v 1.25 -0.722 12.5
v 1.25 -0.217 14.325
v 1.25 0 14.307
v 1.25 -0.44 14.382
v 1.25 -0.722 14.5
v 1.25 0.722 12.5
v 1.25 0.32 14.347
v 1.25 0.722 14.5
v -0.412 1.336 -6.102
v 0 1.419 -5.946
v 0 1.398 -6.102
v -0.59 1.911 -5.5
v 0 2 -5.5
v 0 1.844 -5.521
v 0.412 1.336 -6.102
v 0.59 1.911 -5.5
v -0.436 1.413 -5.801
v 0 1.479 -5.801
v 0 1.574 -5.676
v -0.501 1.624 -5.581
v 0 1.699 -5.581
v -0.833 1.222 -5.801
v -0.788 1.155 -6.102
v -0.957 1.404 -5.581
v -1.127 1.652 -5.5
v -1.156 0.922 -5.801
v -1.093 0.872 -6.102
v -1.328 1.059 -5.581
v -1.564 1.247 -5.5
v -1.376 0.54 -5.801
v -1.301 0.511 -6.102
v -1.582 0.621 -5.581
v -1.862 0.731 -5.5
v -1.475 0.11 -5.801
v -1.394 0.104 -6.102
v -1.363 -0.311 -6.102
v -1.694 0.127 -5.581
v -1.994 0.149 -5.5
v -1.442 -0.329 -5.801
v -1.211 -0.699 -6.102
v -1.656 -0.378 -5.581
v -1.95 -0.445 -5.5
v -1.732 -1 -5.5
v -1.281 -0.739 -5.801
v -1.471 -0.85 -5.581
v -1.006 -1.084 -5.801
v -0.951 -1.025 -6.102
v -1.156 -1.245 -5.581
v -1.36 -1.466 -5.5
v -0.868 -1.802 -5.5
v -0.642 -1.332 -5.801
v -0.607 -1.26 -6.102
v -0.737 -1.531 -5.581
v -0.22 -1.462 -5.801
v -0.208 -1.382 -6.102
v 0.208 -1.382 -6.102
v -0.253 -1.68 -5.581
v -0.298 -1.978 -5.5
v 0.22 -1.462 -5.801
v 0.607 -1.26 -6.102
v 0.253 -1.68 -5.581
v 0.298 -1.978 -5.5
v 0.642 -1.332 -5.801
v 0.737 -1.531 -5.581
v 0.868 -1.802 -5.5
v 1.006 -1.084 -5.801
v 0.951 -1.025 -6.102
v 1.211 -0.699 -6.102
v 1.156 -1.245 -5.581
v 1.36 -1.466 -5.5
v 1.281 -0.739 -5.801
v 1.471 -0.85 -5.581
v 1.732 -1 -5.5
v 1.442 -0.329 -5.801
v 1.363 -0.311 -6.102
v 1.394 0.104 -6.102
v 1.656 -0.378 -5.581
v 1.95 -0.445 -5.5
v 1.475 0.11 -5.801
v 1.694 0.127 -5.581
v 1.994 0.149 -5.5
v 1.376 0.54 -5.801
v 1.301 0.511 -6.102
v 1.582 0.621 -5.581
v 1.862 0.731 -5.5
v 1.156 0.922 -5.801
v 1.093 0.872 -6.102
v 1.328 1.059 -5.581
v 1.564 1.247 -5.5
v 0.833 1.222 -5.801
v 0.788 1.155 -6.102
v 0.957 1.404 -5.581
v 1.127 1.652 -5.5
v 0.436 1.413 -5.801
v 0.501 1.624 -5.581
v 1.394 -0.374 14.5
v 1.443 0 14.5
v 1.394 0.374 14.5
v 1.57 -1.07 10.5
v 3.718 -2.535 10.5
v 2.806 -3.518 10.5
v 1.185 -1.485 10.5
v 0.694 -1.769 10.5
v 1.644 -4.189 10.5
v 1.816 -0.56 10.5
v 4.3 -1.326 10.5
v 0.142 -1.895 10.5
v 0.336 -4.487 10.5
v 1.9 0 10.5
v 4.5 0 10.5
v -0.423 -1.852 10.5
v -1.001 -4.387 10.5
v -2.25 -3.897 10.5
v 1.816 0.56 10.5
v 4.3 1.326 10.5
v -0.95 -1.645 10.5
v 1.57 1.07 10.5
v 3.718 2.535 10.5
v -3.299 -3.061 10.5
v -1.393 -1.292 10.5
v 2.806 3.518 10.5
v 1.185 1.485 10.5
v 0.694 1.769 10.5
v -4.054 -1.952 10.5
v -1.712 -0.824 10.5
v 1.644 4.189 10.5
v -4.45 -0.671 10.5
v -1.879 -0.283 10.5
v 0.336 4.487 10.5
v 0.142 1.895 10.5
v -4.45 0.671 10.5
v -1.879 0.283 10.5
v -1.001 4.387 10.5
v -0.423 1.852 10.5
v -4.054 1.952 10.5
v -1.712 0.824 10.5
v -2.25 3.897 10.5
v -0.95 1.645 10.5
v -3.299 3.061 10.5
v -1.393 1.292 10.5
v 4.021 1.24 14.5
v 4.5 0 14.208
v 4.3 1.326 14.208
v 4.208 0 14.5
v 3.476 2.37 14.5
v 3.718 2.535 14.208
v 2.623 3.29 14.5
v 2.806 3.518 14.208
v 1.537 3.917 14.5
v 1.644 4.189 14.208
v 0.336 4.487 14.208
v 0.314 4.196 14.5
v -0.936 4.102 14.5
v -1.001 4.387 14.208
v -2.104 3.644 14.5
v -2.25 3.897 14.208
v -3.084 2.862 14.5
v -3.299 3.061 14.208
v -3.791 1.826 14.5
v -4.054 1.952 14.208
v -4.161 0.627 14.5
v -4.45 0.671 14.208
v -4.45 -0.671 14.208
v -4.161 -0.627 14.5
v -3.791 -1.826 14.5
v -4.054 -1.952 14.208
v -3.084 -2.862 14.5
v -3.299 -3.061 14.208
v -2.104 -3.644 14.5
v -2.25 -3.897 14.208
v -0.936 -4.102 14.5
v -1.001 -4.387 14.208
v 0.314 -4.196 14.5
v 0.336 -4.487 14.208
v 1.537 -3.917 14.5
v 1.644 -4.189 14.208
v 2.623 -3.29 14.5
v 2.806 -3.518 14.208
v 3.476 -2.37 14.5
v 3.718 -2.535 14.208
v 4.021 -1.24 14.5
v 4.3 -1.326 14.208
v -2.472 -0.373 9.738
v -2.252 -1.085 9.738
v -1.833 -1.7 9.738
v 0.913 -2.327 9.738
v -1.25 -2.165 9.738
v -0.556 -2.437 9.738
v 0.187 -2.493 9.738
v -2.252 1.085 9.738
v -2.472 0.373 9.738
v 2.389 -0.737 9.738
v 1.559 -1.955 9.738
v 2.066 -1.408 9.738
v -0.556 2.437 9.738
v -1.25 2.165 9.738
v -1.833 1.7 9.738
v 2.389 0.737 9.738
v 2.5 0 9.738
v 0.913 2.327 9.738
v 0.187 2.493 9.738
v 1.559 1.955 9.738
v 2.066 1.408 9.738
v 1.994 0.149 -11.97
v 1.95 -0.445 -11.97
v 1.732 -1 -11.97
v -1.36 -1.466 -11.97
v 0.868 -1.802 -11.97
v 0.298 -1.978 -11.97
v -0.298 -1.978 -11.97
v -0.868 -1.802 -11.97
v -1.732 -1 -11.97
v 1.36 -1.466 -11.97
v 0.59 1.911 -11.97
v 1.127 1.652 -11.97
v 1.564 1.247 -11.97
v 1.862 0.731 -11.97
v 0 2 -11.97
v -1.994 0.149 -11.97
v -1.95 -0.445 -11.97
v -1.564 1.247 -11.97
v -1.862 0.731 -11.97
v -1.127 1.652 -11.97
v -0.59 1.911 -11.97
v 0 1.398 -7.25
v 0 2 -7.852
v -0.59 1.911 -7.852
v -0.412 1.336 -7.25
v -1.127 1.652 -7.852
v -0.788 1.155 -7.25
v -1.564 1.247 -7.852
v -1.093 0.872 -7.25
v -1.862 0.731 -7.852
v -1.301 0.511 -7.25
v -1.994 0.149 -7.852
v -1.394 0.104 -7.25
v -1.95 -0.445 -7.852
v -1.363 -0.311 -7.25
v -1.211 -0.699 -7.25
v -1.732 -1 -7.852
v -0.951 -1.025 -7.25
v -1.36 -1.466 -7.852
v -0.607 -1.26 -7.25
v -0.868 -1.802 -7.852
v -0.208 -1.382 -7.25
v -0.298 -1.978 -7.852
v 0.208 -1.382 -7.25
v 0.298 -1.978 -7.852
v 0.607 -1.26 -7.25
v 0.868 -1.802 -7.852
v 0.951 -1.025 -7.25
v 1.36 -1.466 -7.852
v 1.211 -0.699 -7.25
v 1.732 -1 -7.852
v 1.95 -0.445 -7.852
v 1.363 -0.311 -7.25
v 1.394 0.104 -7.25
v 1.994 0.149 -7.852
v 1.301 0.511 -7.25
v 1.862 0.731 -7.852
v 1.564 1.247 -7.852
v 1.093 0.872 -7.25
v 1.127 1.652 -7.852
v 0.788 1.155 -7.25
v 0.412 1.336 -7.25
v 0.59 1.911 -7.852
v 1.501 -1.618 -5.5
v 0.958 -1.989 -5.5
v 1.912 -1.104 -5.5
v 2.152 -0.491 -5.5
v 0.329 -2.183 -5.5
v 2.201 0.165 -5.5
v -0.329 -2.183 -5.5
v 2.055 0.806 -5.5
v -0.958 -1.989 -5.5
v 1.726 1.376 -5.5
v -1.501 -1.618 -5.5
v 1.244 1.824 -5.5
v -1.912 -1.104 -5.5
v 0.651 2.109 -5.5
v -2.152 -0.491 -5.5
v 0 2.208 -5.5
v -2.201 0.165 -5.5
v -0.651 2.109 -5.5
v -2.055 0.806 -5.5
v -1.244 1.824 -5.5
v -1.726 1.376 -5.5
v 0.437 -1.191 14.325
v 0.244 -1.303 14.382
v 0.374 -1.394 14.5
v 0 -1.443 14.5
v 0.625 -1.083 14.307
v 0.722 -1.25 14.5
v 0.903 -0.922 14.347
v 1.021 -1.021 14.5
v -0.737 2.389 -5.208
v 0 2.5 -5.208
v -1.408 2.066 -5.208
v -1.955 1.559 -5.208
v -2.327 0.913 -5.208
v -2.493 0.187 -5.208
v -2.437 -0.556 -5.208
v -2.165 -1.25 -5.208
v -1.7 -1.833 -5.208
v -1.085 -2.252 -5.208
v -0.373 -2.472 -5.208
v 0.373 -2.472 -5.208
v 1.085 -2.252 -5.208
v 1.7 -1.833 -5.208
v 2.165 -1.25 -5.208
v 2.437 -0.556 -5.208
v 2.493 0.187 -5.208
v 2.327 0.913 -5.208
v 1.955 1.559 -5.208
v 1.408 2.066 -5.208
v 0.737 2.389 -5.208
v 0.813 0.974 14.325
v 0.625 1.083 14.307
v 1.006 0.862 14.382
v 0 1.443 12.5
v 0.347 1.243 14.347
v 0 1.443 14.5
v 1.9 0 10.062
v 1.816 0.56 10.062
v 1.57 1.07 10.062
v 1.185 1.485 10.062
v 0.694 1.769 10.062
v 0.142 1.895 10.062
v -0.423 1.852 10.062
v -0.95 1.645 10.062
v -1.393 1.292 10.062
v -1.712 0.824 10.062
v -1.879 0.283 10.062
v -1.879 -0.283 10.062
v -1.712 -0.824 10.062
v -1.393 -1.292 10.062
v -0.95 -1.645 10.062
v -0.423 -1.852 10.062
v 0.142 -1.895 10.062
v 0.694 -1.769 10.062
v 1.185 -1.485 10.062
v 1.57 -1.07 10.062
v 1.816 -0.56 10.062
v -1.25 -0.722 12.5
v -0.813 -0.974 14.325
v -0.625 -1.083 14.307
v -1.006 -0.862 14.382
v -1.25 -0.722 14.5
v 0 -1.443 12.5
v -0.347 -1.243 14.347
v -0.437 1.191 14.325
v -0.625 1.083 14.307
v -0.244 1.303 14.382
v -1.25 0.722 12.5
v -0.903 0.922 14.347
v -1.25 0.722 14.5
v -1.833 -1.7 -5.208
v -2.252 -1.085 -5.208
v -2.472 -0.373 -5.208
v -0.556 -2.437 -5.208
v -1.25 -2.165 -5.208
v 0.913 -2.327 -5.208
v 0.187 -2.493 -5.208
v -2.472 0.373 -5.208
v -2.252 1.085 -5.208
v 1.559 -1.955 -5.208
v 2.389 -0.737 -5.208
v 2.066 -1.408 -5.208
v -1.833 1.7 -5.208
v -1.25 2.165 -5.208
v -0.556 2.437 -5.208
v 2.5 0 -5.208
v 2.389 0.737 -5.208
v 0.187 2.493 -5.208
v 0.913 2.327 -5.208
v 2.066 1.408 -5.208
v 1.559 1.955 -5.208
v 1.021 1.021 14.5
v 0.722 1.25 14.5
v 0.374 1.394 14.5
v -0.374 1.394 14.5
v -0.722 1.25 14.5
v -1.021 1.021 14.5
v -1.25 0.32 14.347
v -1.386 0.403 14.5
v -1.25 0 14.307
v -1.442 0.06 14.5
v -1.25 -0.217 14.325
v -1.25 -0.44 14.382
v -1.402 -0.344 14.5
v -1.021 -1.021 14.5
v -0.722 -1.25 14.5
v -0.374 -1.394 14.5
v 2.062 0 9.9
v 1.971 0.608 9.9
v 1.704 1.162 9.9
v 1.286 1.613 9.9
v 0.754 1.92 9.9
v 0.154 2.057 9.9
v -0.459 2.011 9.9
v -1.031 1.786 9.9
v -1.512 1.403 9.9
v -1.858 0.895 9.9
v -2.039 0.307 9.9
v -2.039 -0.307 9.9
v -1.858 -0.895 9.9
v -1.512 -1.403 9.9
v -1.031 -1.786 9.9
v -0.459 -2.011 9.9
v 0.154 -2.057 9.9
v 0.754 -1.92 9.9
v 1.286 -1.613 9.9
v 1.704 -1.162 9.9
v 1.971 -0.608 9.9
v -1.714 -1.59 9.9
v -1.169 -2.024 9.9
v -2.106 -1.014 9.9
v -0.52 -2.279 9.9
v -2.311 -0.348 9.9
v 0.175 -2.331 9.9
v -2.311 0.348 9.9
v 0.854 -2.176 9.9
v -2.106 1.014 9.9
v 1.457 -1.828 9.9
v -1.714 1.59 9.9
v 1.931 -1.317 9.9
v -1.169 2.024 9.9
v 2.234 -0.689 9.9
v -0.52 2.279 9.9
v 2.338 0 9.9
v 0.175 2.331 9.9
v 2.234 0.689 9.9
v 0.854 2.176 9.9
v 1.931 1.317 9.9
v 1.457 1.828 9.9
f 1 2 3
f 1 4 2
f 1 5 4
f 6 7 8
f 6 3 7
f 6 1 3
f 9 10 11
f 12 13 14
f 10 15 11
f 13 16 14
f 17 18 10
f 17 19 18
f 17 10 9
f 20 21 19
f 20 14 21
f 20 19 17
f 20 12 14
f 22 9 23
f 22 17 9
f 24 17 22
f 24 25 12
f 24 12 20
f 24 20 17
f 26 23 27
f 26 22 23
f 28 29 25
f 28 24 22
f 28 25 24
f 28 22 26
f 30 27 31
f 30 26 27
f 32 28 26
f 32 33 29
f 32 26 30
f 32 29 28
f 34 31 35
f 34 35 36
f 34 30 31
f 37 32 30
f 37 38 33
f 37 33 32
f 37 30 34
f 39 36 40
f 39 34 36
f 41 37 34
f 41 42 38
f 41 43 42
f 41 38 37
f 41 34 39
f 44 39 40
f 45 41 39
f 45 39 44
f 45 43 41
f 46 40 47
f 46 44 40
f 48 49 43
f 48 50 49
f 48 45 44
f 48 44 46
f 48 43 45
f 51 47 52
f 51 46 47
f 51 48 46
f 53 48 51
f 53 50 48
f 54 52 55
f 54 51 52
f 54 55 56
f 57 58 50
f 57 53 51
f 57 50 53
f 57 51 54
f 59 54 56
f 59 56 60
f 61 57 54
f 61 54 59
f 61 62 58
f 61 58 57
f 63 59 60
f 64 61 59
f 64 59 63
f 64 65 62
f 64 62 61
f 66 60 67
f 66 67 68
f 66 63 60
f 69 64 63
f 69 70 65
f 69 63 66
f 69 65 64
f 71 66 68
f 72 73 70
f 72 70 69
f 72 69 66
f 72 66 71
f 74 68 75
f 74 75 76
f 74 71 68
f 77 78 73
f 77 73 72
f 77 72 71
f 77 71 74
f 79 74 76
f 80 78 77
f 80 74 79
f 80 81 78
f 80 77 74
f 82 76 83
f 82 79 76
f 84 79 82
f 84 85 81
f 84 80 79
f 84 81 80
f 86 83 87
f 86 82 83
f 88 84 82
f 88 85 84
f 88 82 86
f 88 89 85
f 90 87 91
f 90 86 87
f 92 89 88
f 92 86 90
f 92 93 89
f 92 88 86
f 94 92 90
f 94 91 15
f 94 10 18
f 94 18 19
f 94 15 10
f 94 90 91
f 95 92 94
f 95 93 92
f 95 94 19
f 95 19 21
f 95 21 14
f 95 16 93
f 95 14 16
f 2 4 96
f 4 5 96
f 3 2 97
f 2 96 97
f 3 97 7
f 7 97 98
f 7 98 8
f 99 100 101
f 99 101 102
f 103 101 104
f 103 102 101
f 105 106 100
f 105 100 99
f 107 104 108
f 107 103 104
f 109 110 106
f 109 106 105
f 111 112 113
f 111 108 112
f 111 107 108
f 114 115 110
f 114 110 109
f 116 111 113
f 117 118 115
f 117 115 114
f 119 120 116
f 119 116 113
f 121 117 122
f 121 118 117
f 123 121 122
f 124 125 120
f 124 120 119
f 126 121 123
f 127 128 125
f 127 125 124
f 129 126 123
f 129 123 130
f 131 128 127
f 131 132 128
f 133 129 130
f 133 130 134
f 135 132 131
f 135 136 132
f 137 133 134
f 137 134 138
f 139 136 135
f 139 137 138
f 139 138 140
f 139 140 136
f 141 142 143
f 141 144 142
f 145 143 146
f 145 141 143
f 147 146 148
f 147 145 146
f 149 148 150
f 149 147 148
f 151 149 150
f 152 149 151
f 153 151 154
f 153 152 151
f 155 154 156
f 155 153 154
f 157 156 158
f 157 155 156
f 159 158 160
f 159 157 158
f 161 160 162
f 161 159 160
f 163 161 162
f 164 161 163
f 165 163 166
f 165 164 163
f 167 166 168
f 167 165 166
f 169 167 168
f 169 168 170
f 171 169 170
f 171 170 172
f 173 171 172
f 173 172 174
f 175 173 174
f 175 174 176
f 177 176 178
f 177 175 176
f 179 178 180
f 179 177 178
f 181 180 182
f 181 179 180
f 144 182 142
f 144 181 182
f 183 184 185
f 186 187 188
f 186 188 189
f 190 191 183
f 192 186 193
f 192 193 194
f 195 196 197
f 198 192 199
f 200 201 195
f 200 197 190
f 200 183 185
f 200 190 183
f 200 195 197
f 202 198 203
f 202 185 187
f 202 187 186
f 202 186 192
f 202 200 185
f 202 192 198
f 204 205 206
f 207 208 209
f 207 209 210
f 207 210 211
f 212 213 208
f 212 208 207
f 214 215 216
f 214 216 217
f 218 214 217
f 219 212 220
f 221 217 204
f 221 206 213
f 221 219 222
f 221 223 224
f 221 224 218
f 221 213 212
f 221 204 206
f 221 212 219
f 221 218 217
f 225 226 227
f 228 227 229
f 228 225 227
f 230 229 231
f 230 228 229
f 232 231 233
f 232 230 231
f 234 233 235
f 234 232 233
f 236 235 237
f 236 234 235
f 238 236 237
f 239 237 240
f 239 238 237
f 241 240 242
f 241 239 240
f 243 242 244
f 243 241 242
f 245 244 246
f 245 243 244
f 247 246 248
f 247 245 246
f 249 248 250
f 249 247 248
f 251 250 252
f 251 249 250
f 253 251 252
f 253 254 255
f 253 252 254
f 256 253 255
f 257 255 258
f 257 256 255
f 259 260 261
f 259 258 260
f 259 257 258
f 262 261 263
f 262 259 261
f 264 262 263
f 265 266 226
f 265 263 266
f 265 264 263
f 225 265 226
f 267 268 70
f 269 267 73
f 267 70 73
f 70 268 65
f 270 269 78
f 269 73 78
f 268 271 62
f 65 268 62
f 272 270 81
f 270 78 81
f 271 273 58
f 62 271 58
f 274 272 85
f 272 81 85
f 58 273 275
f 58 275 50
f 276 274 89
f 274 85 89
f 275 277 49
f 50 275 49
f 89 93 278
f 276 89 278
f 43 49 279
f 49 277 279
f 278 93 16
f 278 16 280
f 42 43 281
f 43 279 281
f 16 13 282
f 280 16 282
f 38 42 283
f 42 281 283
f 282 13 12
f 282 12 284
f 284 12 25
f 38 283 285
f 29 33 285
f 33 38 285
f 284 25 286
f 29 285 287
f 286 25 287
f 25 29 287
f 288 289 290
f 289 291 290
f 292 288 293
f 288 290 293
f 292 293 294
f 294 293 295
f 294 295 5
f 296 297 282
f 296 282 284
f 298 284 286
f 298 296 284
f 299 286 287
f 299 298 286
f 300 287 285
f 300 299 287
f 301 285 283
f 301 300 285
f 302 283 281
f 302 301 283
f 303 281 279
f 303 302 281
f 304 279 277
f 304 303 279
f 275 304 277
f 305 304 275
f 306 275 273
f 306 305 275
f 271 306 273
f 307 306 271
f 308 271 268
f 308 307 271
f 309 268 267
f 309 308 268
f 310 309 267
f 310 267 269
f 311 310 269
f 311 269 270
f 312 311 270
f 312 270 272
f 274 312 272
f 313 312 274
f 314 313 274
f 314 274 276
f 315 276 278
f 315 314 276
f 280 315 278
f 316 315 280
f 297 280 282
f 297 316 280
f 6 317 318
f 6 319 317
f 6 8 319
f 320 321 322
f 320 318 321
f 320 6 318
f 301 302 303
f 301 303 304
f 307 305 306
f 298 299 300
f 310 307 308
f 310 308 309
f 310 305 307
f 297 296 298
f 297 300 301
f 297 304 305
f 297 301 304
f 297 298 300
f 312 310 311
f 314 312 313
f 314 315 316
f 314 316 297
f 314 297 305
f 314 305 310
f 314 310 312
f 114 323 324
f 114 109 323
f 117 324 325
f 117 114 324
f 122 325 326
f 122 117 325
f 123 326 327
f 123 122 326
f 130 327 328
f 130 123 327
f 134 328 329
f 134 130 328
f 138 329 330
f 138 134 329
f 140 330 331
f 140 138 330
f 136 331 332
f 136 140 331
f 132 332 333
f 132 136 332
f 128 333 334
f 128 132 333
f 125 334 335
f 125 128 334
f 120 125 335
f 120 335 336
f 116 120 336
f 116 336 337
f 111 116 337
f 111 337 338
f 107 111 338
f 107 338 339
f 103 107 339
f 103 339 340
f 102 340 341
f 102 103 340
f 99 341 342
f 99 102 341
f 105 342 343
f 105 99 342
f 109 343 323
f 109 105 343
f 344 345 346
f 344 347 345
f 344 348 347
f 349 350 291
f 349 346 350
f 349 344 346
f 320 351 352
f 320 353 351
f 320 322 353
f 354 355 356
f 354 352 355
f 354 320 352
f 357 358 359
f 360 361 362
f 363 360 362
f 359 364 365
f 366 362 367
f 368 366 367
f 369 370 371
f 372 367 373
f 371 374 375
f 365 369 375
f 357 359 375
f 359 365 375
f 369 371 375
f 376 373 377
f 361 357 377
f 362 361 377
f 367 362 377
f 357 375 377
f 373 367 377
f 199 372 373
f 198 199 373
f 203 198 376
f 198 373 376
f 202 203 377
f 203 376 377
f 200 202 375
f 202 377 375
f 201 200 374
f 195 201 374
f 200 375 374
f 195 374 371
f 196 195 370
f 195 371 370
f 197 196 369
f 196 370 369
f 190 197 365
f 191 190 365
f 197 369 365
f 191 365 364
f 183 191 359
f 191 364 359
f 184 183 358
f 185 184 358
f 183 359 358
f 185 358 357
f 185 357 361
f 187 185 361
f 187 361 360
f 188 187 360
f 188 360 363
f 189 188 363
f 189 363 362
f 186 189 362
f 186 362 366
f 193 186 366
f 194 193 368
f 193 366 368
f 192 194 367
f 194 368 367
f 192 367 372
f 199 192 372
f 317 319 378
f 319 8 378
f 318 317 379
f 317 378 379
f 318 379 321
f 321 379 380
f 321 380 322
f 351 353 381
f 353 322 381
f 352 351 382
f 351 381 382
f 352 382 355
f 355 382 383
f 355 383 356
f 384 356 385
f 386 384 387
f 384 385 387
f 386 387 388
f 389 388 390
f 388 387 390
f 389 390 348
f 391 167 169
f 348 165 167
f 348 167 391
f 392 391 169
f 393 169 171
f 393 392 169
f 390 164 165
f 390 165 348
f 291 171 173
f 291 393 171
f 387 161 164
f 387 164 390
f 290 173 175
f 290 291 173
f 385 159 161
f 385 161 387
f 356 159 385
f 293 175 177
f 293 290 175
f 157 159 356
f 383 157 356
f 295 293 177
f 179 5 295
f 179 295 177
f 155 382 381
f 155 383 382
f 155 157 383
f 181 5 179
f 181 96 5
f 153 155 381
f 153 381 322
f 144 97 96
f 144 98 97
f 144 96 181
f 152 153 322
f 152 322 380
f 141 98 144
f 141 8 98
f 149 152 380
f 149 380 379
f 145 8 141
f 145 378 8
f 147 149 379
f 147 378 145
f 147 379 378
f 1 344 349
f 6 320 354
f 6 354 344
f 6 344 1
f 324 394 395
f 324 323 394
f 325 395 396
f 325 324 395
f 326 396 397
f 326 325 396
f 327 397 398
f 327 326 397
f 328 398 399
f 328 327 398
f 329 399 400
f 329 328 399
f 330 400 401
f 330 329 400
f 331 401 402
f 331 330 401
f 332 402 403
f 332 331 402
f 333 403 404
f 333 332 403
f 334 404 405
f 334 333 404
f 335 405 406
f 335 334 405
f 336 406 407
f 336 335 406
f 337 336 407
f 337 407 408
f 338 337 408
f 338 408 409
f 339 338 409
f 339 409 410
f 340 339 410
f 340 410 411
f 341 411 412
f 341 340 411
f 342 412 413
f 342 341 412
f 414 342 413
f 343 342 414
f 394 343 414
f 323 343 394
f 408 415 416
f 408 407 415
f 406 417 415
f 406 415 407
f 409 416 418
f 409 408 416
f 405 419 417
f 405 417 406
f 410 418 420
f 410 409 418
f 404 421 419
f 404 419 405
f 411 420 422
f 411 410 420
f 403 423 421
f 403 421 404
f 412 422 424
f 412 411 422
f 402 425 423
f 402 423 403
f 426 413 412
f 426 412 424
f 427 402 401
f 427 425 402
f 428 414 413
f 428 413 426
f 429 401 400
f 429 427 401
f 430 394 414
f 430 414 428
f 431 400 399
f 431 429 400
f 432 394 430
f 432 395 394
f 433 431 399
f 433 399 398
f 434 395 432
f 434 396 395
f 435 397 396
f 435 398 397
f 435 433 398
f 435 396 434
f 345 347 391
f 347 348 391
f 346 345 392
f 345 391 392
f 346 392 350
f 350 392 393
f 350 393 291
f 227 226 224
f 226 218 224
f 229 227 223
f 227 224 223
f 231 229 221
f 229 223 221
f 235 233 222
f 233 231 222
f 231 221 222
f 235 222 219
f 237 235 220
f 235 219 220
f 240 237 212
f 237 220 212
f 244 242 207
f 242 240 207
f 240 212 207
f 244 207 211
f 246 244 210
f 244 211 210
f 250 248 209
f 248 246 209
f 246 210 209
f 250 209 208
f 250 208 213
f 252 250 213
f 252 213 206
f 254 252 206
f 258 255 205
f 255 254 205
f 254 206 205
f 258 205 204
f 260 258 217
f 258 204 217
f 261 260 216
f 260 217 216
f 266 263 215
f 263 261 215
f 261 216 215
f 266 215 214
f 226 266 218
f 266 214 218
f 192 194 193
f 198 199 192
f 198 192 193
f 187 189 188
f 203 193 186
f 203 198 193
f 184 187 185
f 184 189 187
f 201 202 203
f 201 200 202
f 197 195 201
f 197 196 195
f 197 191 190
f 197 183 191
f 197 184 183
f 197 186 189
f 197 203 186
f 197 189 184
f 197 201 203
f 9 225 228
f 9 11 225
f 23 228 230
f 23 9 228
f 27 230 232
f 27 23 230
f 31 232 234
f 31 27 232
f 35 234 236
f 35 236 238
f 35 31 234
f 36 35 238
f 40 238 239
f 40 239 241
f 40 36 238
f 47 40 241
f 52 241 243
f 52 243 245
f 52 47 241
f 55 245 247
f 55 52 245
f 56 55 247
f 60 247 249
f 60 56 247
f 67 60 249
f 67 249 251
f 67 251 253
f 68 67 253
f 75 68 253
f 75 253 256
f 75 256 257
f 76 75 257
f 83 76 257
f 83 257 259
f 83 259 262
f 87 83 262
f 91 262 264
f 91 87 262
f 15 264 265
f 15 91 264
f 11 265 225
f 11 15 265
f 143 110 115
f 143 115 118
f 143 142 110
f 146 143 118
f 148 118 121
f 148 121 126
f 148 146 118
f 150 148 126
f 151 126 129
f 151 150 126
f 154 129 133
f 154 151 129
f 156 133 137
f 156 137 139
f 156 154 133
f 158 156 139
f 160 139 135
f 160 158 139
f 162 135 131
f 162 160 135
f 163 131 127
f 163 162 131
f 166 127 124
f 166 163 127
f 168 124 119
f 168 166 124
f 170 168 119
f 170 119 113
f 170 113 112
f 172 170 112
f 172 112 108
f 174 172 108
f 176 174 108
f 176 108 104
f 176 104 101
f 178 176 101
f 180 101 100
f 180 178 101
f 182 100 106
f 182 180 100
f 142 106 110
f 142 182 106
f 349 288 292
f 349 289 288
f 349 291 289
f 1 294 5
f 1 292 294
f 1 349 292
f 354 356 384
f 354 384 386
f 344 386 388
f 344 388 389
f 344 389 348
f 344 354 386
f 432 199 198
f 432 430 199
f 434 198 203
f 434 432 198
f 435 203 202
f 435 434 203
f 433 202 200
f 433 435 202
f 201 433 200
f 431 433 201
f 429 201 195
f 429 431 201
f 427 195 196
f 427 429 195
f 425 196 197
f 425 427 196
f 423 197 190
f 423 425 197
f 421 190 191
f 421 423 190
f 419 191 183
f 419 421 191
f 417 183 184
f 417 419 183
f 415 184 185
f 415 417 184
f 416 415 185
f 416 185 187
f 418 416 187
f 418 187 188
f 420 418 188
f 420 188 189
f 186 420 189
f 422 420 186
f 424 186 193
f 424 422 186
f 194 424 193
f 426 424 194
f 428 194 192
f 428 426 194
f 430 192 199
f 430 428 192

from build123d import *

# Parameters (mm, degrees)
SKETCH4_W           = 0.6
SKETCH4_H           = 0.6
CHAMFER1_SIZE       = 0.1625
CHAMFER2_SIZE       = 0.5
CHAMFER3_SIZE       = 0.2925
CUT_EXTRUDE1_DEPTH  = 2
SPLIT2_START        = -5.2075
SPLIT2_OUTLINE_R    = 4.5
SPLIT2_DEPTH        = 19.7075
SPLIT2_START_2      = 12.5
SPLIT2_3_DEPTH      = 2
SPLIT2_10_OUTLINE_R = 2.5
SPLIT2_10_DEPTH     = 14.945
SKETCH15_R          = 2.571420452
CUT_EXTRUDE4_DEPTH  = 2.53


with BuildPart() as part:
    # Sketch3 → Revolve1 (revolve)
    with BuildSketch(Plane(origin=(0, 0, 0), x_dir=(0, 0, -1), z_dir=(1, 0, 0))):
        Polygon((-14.5, 4.5), (-10.5, 4.5), (-10.5, 2.5), (5.5, 2.5), (5.5, 2), (14.5, 2), (14.5, 0), (-14.5, 0), align=None)
    revolve(axis=Axis((0, 0, -14.5), (0, 0, 1)))

    # Sketch4 → Cut-Revolve1 (revolve, cut)
    with BuildSketch(Plane(origin=(0, 0, 0), x_dir=(0, 0, -1), z_dir=(1, 0, 0))):
        with Locations((-10.2, 2.2)):
            Rectangle(SKETCH4_W, SKETCH4_H)
    revolve(axis=Axis((0, 0, -14.5), (0, 0, 1)), mode=Mode.SUBTRACT)

    # Chamfer1
    chamfer1_edges = [part.edges().sort_by_distance(p)[0] for p in [
        (0, -1.9, 9.9),
        (0, -2.5, 9.9),
    ]]
    chamfer(chamfer1_edges, length=CHAMFER1_SIZE)

    # Sketch6 → Cut-Revolve2 (revolve, cut)
    with BuildSketch(Plane(origin=(0, 0, 0), x_dir=(0, 0, -1), z_dir=(1, 0, 0))):
        with BuildLine():
            Line((5.5, 2.5), (8.352, 2.5))
            Line((8.352, 2.5), (7.25, 1.398))
            Line((7.25, 1.398), (6.102, 1.398))
            ThreePointArc((6.102, 1.398), (5.676321718, 1.574321718), (5.5, 2))
            Line((5.5, 2), (5.5, 2.5))
        make_face()
    revolve(axis=Axis((0, 0, -14.5), (0, 0, 1)), mode=Mode.SUBTRACT)

    # Chamfer2
    chamfer2_edges = [part.edges().sort_by_distance(p)[0] for p in [
        (0, -2, -14.5),
    ]]
    chamfer(chamfer2_edges, length=CHAMFER2_SIZE)

    # Chamfer3
    chamfer3_edges = [part.edges().sort_by_distance(p)[0] for p in [
        (0, -2.5, -5.5),
        (0, -4.5, 14.5),
    ]]
    chamfer(chamfer3_edges, length=CHAMFER3_SIZE)

    # Sketch8 → Cut-Extrude1 (cut)
    with BuildSketch(Plane.XY.offset(14.5)):
        Polygon((1.25, 0.721687836), (0, 1.443375673), (-1.25, 0.721687836), (-1.25, -0.721687836), (0, -1.443375673), (1.25, -0.721687836), align=None)
    extrude(amount=-CUT_EXTRUDE1_DEPTH, mode=Mode.SUBTRACT)

    # Cut-Extrude2 cone 1 section (through the dimple's axis) → Cut-Extrude2 (revolve, cut)
    with BuildSketch(Plane(origin=(0, 0, 14.5), x_dir=(0, -1, 0), z_dir=(1, 0, 0))):
        Polygon((0, 0), (1.443375673, 0), (0, 1.443375673), align=None)
    revolve(axis=Axis((0, 0, 14.5), (0, 0, -1)), mode=Mode.SUBTRACT)

    # Split2: read off the stored shape, not the designer's step
    # Split2 outline → Split2 (cut)
    with BuildSketch(Plane.XY.offset(SPLIT2_START)):
        Circle(SPLIT2_OUTLINE_R)
    extrude(amount=SPLIT2_DEPTH, mode=Mode.SUBTRACT)

    # Sketch15 → Cut-Extrude4 (cut)
    with BuildSketch(Plane(origin=(0, 0, -14.5), x_dir=(-1, 0, 0), z_dir=(0, 0, -1))):
        Circle(SKETCH15_R)
    extrude(amount=-CUT_EXTRUDE4_DEPTH, mode=Mode.SUBTRACT)


with BuildPart() as body_2:
    # Split2 2 outline → Split2 2 (revolve)
    with BuildSketch(Plane.XZ):
        Polygon((0, 14.500000022), (0, 9.7375), (2.5, 9.7375), (2.3375, 9.9), (2.0625, 9.9), (1.9, 10.0625), (1.9, 10.5), (4.5, 10.5), (4.5, 14.2075), (4.2075, 14.5), (1.443375689, 14.500000017), align=None)
    revolve(axis=Axis((0, 0, 0), (0, 0, 1)))

    # Split2 3 outline → Split2 3 (cut)
    with BuildSketch(Plane.XY.offset(SPLIT2_START_2)):
        Polygon((1.25, -0.721687836), (1.25, 0.721687836), (0, 1.443375673), (-1.25, 0.721687836), (-1.25, -0.721687836), (0, -1.443375673), align=None)
    extrude(amount=SPLIT2_3_DEPTH, mode=Mode.SUBTRACT)

    # Split2 4: loft between two sections, ruled curve by curve
    split2_4_from = [
        Edge.make_three_point_arc((1.08239615, 0.624921709, 14.306467745), (0.624921709, 1.08239615, 14.306467745), (0, 1.249843418, 14.306467745)),
        Edge.make_line((0, 1.249843418, 14.306467745), (1.08239615, 0.624921709, 14.306467745)),
    ]
    split2_4_to = [
        Edge.make_three_point_arc((1.250000029, 0.721687853, 14.500000033), (0.721687853, 1.250000029, 14.500000033), (0, 1.443375706, 14.500000033)),
        Edge.make_line((0, 1.443375706, 14.500000033), (1.250000029, 0.721687853, 14.500000033)),
    ]
    split2_4 = Solid(Shell([*[Face.make_surface_from_curves(split2_4_from[k], split2_4_to[k]) for k in range(2)], Face(Wire(split2_4_from)), Face(Wire(split2_4_to))]))
    add(split2_4, mode=Mode.SUBTRACT)

    # Split2 5: loft between two sections, ruled curve by curve
    split2_5_from = [
        Edge.make_three_point_arc((0, 1.249843418, 14.306467745), (-0.624921709, 1.08239615, 14.306467745), (-1.08239615, 0.624921709, 14.306467745)),
        Edge.make_line((-1.08239615, 0.624921709, 14.306467745), (0, 1.249843418, 14.306467745)),
    ]
    split2_5_to = [
        Edge.make_three_point_arc((0, 1.443375706, 14.500000033), (-0.721687853, 1.250000029, 14.500000033), (-1.250000029, 0.721687853, 14.500000033)),
        Edge.make_line((-1.250000029, 0.721687853, 14.500000033), (0, 1.443375706, 14.500000033)),
    ]
    split2_5 = Solid(Shell([*[Face.make_surface_from_curves(split2_5_from[k], split2_5_to[k]) for k in range(2)], Face(Wire(split2_5_from)), Face(Wire(split2_5_to))]))
    add(split2_5, mode=Mode.SUBTRACT)

    # Split2 6: loft between two sections, ruled curve by curve
    split2_6_from = [
        Edge.make_three_point_arc((-1.082395782, 0.624921515, 14.306467329), (-1.249843002, -4.66e-07, 14.306467329), (-1.082395316, -0.624922322, 14.306467329)),
        Edge.make_line((-1.082395316, -0.624922322, 14.306467329), (-1.082395782, 0.624921515, 14.306467329)),
    ]
    split2_6_to = [
        Edge.make_three_point_arc((-1.249999991, 0.721687853, 14.5), (-1.443375673, -5.38e-07, 14.5), (-1.249999452, -0.721688785, 14.5)),
        Edge.make_line((-1.249999452, -0.721688785, 14.5), (-1.249999991, 0.721687853, 14.5)),
    ]
    split2_6 = Solid(Shell([*[Face.make_surface_from_curves(split2_6_from[k], split2_6_to[k]) for k in range(2)], Face(Wire(split2_6_from)), Face(Wire(split2_6_to))]))
    add(split2_6, mode=Mode.SUBTRACT)

    # Split2 7: loft between two sections, ruled curve by curve
    split2_7_from = [
        Edge.make_three_point_arc((-1.08239615, -0.624921709, 14.306467745), (-0.624921709, -1.08239615, 14.306467745), (0, -1.249843418, 14.306467745)),
        Edge.make_line((0, -1.249843418, 14.306467745), (-1.08239615, -0.624921709, 14.306467745)),
    ]
    split2_7_to = [
        Edge.make_three_point_arc((-1.250000029, -0.721687853, 14.500000033), (-0.721687853, -1.250000029, 14.500000033), (0, -1.443375706, 14.500000033)),
        Edge.make_line((0, -1.443375706, 14.500000033), (-1.250000029, -0.721687853, 14.500000033)),
    ]
    split2_7 = Solid(Shell([*[Face.make_surface_from_curves(split2_7_from[k], split2_7_to[k]) for k in range(2)], Face(Wire(split2_7_from)), Face(Wire(split2_7_to))]))
    add(split2_7, mode=Mode.SUBTRACT)

    # Split2 8: loft between two sections, ruled curve by curve
    split2_8_from = [
        Edge.make_three_point_arc((0, -1.249843418, 14.306467745), (0.624921709, -1.08239615, 14.306467745), (1.08239615, -0.624921709, 14.306467745)),
        Edge.make_line((1.08239615, -0.624921709, 14.306467745), (0, -1.249843418, 14.306467745)),
    ]
    split2_8_to = [
        Edge.make_three_point_arc((0, -1.443375706, 14.500000033), (0.721687853, -1.250000029, 14.500000033), (1.250000029, -0.721687853, 14.500000033)),
        Edge.make_line((1.250000029, -0.721687853, 14.500000033), (0, -1.443375706, 14.500000033)),
    ]
    split2_8 = Solid(Shell([*[Face.make_surface_from_curves(split2_8_from[k], split2_8_to[k]) for k in range(2)], Face(Wire(split2_8_from)), Face(Wire(split2_8_to))]))
    add(split2_8, mode=Mode.SUBTRACT)

    # Split2 9: loft between two sections, ruled curve by curve
    split2_9_from = [
        Edge.make_three_point_arc((1.082395316, -0.624922322, 14.306467329), (1.249843002, -4.66e-07, 14.306467329), (1.082395782, 0.624921515, 14.306467329)),
        Edge.make_line((1.082395782, 0.624921515, 14.306467329), (1.082395316, -0.624922322, 14.306467329)),
    ]
    split2_9_to = [
        Edge.make_three_point_arc((1.249999452, -0.721688785, 14.5), (1.443375673, -5.38e-07, 14.5), (1.249999991, 0.721687853, 14.5)),
        Edge.make_line((1.249999991, 0.721687853, 14.5), (1.249999452, -0.721688785, 14.5)),
    ]
    split2_9 = Solid(Shell([*[Face.make_surface_from_curves(split2_9_from[k], split2_9_to[k]) for k in range(2)], Face(Wire(split2_9_from)), Face(Wire(split2_9_to))]))
    add(split2_9, mode=Mode.SUBTRACT)


with BuildPart() as body_3:
    # Split2 10 outline → Split2 10 (new body)
    with BuildSketch(Plane.XY.offset(SPLIT2_START)):
        Circle(SPLIT2_10_OUTLINE_R)
    extrude(amount=SPLIT2_10_DEPTH)


solid = Compound([part.part, body_2.part, body_3.part])
